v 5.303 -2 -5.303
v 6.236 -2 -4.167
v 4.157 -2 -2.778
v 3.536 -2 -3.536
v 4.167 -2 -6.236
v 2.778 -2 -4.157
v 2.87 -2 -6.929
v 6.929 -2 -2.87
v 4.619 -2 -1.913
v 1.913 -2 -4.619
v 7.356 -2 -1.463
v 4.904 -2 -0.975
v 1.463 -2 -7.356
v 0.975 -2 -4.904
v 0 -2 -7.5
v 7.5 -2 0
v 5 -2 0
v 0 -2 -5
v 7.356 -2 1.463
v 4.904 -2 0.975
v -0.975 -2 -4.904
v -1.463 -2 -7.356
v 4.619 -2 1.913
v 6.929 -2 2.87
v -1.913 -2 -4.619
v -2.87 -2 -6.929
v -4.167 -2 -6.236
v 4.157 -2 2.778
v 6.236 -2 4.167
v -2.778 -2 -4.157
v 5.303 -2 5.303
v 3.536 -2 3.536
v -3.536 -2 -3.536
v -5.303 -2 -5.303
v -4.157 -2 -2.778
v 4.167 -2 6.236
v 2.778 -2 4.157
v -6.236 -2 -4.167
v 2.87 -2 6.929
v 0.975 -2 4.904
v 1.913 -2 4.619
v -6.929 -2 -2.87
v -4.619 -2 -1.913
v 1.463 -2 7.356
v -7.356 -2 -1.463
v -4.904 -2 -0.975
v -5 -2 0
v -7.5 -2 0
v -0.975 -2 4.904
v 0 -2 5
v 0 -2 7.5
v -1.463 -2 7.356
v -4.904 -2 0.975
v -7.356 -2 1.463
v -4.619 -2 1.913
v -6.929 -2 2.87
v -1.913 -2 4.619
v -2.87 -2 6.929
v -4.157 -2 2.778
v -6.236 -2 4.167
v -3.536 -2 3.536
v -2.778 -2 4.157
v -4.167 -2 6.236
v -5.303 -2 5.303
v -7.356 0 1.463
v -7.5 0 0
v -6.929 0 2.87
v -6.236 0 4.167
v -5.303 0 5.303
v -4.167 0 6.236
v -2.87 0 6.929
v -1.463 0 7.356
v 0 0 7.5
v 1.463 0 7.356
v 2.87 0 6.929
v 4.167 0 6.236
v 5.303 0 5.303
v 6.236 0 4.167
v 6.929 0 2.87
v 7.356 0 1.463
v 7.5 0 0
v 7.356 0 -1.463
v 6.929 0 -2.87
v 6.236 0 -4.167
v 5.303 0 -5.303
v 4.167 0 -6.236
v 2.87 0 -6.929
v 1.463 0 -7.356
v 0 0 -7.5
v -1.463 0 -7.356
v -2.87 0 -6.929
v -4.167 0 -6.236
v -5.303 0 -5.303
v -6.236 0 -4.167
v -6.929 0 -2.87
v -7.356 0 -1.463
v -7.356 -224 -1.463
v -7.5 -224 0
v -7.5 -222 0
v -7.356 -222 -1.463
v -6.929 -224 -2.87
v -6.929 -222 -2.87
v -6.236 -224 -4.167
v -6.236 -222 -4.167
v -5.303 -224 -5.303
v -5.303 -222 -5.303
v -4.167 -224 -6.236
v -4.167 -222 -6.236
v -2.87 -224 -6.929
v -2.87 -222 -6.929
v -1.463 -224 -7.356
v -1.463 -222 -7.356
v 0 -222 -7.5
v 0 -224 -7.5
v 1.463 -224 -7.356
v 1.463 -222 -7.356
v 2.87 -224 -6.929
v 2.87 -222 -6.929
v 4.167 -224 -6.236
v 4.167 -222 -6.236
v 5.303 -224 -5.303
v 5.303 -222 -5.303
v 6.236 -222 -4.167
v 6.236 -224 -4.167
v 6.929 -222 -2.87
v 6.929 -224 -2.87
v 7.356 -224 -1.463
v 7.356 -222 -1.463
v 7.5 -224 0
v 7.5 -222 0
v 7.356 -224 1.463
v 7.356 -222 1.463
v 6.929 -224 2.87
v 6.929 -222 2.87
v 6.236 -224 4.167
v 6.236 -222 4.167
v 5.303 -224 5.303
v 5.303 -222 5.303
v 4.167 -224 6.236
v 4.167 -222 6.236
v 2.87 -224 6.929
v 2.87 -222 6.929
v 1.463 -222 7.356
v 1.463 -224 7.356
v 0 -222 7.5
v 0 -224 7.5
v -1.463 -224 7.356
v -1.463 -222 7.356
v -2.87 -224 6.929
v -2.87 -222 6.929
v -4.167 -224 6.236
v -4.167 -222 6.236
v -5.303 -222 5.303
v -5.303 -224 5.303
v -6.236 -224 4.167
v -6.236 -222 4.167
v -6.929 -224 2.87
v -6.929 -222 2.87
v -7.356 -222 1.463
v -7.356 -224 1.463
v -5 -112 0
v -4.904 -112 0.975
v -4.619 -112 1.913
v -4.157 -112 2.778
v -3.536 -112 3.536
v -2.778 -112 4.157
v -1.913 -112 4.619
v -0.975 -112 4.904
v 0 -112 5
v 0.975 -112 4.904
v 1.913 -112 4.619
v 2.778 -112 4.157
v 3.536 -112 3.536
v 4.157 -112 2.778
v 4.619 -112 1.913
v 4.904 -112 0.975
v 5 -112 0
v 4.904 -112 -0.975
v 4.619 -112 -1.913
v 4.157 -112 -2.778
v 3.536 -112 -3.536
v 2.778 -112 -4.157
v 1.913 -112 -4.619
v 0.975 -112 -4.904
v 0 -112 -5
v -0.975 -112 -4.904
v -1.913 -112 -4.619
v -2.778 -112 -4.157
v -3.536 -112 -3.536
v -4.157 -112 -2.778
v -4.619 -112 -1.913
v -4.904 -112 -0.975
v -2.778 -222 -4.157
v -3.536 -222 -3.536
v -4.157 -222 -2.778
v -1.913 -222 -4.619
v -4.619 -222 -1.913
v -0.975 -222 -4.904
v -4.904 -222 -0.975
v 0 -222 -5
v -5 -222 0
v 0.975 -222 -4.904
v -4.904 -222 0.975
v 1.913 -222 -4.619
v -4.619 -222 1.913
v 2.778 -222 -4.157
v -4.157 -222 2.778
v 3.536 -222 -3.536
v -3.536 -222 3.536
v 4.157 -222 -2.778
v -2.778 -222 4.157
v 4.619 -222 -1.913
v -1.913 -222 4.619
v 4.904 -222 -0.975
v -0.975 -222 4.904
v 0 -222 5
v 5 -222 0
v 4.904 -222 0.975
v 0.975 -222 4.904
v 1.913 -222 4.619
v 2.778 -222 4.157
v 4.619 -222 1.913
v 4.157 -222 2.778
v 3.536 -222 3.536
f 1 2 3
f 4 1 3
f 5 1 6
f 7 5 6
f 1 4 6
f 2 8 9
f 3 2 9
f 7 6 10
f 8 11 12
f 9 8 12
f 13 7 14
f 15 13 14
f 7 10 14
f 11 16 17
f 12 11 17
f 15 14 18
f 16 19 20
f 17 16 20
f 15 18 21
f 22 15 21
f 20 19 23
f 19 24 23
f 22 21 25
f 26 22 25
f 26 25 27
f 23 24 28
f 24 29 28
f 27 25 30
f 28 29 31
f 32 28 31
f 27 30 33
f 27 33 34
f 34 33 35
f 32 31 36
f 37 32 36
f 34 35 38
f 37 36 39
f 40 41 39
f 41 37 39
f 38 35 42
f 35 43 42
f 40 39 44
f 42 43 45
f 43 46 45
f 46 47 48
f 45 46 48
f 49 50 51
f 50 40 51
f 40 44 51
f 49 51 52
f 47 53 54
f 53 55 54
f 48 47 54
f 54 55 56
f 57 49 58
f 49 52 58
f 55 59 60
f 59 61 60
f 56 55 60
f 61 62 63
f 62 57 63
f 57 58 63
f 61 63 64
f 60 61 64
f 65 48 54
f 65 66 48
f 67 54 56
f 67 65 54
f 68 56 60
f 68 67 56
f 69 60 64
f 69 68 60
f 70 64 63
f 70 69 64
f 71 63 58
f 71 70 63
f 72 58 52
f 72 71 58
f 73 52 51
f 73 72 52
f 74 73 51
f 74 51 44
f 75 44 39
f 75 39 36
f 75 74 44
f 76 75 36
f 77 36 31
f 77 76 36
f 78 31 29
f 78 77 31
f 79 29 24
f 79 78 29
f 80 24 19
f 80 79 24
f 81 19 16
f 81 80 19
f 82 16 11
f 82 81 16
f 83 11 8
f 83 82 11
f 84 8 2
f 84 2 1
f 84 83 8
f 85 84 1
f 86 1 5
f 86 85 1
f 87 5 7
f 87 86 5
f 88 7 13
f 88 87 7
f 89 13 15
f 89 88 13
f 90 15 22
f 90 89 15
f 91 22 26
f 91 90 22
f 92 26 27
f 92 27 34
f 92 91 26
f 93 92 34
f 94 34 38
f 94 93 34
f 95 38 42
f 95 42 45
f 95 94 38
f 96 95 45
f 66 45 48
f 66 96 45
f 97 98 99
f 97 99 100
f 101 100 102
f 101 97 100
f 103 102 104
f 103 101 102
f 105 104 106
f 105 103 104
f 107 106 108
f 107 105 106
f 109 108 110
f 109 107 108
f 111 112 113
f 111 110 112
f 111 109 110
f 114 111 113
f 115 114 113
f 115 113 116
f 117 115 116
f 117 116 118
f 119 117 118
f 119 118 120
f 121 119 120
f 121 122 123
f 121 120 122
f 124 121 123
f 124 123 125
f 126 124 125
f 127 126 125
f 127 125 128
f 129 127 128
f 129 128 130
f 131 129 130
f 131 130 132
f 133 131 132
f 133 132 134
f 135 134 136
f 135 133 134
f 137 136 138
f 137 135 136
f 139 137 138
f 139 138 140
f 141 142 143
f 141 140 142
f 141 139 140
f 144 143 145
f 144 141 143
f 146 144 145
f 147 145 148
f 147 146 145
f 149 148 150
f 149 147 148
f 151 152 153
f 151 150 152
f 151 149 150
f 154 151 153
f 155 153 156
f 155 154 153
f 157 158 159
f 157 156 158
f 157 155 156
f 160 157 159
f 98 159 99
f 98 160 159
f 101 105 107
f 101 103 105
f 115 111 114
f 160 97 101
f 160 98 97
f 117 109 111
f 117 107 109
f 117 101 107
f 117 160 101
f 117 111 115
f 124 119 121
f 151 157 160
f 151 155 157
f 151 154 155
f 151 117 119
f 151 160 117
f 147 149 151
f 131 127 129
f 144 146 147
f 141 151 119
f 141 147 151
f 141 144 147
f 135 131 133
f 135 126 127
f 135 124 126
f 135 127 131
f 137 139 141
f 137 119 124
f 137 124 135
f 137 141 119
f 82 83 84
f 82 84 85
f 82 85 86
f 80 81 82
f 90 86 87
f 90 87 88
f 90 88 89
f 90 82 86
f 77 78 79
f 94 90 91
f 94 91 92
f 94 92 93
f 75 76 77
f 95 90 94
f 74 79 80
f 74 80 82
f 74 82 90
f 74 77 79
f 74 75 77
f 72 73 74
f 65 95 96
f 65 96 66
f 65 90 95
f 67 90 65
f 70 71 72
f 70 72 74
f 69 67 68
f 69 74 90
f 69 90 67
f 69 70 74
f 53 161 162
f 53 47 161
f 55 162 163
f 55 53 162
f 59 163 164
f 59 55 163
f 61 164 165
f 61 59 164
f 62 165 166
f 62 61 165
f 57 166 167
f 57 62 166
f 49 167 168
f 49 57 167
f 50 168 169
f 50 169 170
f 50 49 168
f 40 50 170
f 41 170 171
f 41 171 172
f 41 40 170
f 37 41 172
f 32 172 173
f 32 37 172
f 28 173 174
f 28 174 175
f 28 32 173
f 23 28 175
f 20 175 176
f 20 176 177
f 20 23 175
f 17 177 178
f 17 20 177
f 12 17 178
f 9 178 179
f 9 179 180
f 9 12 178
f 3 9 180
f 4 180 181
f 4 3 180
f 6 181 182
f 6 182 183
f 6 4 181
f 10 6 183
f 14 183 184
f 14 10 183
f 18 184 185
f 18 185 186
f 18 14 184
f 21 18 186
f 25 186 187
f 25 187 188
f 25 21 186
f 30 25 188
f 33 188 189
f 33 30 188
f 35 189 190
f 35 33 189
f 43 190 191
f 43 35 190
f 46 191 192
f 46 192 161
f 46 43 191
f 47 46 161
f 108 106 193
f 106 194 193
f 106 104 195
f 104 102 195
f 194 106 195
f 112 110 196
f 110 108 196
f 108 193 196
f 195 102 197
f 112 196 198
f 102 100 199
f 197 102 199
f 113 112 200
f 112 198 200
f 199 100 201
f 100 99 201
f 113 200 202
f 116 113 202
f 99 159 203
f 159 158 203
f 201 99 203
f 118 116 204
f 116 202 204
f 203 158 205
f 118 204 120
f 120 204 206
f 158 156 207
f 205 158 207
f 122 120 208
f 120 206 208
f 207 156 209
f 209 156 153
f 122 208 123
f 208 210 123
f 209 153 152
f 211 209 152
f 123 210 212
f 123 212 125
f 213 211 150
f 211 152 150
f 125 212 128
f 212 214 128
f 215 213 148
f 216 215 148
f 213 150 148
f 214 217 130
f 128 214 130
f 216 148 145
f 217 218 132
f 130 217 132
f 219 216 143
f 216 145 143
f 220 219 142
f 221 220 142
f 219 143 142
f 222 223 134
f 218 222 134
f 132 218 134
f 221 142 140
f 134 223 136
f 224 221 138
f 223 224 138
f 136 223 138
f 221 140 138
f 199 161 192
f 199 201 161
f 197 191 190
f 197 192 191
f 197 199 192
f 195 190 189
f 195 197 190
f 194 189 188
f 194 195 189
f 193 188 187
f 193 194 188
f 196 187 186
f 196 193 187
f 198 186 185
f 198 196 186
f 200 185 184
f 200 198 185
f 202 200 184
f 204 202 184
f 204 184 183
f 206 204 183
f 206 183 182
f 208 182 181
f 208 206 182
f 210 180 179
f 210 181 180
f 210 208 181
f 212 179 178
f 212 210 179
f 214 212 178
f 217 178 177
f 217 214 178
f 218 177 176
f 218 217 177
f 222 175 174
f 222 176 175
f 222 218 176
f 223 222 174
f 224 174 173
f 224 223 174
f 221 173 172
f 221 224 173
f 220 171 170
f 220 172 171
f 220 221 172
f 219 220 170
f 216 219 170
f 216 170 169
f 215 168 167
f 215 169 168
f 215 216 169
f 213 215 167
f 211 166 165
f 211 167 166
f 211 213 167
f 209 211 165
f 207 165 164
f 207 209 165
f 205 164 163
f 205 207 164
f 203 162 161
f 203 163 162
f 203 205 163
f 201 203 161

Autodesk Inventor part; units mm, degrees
ref_plane "YZ Plane" through (0, 0, 0) normal (1, 0, 0) x (0, 1, 0)
ref_plane "XZ Plane" through (0, 0, 0) normal (0, 1, 0) x (-1, 0, 0)
ref_plane "XY Plane" through (0, 0, 0) normal (0, 0, 1) x (1, 0, 0)
sketch "Sketch1" plane through (0, 0, 0) normal (0, 1, 0) x (-1, 0, 0)
  circle A0 centre (0, 0) radius 5
  circle A1 centre (0, 0) radius 7.5
  dimension "d0" = 10
  dimension "d1" = 15
extrude "Extrusion1" add sketch "Sketch1" against normal blind 2
extrude "Extrusion2" add sketch "Sketch1" against normal blind 112 contours A0
mirror "Mirror1" about plane through (0, -112, 0) normal (0, -1, 0) of "Extrusion2", "Extrusion1"
